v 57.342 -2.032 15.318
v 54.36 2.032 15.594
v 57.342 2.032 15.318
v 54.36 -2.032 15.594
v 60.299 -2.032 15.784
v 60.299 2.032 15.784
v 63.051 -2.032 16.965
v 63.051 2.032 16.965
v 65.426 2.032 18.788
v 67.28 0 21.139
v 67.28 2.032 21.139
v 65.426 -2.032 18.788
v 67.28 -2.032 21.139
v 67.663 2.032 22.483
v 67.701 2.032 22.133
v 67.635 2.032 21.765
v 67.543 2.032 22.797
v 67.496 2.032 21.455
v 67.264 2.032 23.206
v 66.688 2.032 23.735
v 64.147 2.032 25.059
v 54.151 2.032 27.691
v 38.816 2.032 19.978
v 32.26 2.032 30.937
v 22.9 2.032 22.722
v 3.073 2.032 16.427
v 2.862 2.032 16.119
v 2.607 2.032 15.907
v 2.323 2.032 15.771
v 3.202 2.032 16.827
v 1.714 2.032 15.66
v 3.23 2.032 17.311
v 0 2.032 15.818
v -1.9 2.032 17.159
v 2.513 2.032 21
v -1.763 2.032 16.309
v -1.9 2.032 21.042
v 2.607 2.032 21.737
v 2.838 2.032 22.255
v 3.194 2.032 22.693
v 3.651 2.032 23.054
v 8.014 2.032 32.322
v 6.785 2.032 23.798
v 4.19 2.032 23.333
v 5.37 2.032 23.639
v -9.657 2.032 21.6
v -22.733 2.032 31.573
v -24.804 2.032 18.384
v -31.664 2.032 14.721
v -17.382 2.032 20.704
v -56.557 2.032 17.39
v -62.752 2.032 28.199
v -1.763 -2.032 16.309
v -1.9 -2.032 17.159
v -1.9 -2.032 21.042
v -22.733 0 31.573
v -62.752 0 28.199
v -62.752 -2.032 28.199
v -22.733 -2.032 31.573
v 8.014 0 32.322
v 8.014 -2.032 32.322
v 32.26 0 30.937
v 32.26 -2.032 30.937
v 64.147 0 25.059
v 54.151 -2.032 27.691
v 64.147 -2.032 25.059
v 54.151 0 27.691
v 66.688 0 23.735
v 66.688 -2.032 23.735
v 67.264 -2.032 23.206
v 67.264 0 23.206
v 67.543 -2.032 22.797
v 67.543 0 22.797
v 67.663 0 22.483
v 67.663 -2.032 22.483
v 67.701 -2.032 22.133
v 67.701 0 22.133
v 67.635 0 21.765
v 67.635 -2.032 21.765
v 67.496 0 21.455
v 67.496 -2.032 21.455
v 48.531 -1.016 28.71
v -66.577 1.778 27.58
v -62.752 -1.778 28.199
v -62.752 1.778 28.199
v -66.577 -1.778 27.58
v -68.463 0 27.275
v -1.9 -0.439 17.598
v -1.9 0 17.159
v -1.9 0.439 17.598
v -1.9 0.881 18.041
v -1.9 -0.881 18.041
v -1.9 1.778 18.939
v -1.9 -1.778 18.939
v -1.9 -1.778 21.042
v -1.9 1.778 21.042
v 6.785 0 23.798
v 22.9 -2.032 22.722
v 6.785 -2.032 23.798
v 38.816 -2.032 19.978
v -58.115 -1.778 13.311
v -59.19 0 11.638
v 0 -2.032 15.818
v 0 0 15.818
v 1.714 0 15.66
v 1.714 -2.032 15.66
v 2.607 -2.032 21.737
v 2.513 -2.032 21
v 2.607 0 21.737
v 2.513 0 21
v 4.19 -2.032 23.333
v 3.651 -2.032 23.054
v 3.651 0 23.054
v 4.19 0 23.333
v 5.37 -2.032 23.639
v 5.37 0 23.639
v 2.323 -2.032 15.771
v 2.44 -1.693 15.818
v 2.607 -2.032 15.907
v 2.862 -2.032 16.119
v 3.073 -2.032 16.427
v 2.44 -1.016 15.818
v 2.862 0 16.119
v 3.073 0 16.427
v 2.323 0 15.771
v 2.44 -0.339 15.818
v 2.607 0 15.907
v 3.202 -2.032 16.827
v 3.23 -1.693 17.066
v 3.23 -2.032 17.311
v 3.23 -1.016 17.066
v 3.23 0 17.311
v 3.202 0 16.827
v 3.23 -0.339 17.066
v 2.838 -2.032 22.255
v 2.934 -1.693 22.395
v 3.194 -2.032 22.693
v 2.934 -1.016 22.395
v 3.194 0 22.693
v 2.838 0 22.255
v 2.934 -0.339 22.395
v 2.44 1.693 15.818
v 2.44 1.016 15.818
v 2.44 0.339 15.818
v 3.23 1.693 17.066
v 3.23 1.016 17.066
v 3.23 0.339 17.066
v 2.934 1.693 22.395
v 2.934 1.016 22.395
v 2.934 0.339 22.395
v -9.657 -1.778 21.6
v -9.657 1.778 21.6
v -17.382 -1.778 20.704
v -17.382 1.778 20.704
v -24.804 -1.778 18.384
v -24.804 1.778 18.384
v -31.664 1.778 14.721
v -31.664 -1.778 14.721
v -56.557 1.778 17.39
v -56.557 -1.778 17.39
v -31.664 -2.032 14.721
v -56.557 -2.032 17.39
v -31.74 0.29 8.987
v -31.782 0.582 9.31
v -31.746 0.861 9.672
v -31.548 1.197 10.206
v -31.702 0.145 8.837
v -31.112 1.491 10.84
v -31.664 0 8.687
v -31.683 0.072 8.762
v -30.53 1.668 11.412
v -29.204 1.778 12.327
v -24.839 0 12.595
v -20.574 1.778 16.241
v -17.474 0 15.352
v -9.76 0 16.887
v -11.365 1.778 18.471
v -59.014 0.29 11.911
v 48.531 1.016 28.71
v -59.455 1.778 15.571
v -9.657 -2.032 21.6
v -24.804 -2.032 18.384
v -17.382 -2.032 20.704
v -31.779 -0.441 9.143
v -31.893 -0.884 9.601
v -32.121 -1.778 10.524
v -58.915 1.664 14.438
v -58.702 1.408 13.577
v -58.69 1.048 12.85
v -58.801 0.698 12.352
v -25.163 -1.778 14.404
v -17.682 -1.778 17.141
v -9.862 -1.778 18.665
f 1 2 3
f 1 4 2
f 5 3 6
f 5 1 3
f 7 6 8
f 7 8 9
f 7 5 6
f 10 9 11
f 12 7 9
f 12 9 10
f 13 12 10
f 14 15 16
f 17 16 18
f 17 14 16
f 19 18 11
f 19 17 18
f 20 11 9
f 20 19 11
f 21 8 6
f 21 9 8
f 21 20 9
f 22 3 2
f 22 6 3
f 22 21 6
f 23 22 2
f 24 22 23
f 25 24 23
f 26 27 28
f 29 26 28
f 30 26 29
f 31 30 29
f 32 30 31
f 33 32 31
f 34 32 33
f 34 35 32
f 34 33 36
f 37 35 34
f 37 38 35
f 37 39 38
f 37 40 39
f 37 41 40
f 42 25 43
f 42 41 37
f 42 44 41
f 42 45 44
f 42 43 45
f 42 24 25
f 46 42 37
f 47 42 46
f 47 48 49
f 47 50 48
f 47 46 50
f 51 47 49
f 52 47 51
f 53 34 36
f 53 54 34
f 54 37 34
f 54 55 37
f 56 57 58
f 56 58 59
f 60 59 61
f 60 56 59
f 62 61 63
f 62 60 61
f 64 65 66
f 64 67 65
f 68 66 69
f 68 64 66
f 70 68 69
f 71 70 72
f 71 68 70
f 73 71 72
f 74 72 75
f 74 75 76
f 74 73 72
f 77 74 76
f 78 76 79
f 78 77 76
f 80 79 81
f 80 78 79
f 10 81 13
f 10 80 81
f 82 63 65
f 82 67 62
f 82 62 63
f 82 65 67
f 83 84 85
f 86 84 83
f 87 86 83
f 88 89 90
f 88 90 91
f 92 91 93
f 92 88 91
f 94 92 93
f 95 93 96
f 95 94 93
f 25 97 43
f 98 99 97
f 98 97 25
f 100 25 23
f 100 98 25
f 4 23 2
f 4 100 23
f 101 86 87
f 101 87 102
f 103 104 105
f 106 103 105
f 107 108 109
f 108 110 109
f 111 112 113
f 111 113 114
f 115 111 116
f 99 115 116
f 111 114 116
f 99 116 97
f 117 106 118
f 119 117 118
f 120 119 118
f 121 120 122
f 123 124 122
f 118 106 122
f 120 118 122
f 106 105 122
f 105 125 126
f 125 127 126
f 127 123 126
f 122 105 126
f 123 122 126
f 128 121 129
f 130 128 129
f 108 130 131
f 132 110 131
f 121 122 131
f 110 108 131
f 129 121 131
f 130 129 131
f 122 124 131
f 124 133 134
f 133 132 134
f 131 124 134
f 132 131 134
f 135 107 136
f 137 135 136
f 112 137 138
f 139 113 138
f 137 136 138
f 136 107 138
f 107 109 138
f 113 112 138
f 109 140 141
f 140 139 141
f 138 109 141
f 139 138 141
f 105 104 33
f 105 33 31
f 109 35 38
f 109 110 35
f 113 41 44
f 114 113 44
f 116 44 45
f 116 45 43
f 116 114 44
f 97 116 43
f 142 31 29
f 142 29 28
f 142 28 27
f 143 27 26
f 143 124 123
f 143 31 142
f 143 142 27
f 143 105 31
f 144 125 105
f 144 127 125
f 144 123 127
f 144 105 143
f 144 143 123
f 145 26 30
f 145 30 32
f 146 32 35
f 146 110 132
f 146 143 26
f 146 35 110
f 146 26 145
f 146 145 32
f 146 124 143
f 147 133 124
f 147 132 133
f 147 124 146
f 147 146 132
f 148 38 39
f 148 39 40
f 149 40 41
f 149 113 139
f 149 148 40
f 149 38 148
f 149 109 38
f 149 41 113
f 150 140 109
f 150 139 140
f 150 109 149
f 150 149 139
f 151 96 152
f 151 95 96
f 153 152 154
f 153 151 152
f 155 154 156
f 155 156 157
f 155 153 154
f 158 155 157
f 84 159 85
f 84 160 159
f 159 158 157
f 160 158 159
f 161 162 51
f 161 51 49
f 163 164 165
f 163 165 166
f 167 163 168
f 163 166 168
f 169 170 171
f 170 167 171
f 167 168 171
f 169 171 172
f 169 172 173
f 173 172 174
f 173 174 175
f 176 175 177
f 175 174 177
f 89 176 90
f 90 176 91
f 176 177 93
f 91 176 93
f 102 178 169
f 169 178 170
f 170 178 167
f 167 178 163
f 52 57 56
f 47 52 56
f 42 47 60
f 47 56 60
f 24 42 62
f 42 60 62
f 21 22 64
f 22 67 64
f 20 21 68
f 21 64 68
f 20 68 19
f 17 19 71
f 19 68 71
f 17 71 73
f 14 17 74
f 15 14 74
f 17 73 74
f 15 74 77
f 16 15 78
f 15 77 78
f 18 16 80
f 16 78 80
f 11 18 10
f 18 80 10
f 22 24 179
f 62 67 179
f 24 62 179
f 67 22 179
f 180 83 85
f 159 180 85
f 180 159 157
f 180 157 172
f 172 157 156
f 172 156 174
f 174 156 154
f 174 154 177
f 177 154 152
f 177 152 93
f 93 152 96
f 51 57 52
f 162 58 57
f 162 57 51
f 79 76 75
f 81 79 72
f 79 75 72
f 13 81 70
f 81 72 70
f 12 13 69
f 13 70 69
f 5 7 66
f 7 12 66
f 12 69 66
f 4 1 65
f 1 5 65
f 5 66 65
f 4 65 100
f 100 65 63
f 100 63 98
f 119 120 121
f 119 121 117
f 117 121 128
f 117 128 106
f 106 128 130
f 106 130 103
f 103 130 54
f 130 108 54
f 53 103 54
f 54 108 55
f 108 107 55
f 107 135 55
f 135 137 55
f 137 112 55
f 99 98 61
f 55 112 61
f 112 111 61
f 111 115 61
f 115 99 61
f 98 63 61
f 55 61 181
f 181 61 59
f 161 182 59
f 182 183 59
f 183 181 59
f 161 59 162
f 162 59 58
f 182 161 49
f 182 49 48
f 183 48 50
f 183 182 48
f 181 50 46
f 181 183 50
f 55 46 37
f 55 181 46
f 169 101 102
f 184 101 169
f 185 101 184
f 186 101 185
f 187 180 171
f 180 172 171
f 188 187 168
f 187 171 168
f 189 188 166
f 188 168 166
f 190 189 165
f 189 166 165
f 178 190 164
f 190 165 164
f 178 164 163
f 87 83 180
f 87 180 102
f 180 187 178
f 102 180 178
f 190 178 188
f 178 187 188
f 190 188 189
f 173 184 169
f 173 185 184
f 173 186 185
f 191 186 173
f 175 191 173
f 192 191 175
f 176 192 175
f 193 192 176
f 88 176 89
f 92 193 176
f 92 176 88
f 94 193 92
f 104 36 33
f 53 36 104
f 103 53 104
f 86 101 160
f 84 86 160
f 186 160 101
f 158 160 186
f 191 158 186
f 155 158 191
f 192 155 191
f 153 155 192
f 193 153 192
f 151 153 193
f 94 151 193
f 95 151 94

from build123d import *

# Parameters (mm, degrees)
F1_DEPTH = 2.032
F2_DEPTH = 1.778
F3_SIZE  = 1.77799
F4_R     = 5.08


# Not quite as in the source:
# - a fillet or chamfer is up to 0.001 mm smaller than in the source, because OpenCascade refuses the exact size


with BuildPart() as f1:
    # F0 (on Front) → F1 (new body, symmetric)
    with BuildSketch(Plane.XZ):
        with BuildLine():
            add(Edge.make_bspline(
                [(-62.7524927258, 28.1987972558), (-5.5860476855, 34.2682807977), (34.9384894232, 32.5216500899), (69.9510998155, 24.4512375904), (67.279830575, 21.1393777281)],
                knots=[0, 0, 0, 0, 0.7011346116, 1, 1, 1, 1], degree=3))
            Line((-62.7524927258, 28.1987972558), (-56.5566755831, 17.3903722316))
            Line((-56.5566755831, 17.3903722316), (-31.6641740501, 14.7209839443))
            ThreePointArc((-31.6641740501, 14.7209839443), (-17.3816327548, 20.703845911), (-1.9003116759, 21.0419595242))
            Line((-1.9003116759, 21.0419595242), (-1.9003116759, 17.1594452113))
            Line((-1.9003116759, 17.1594452113), (-1.7631361261, 16.3091998547))
            Line((-1.7631361261, 16.3091998547), (0, 15.8177418634))
            add(Edge.make_bspline(
                [(0, 15.8177418634), (1.0554286018, 15.6506710745), (2.4935673391, 15.483267377), (3.6762898855, 17.0941419119), (2.2318424188, 20.5970397753), (2.747819389, 22.4813980256), (4.3424194487, 23.5829041278), (5.8122159988, 23.7040893948), (6.7852635402, 23.7978529185)],
                knots=[0, 0, 0, 0, 0.1752354273, 0.3115686834, 0.5249745977, 0.6762943435, 0.8224611993, 1, 1, 1, 1], degree=3))
            ThreePointArc((6.7852635402, 23.7978529185), (30.8936565264, 21.5570594528), (54.3601624668, 15.5939338729))
            ThreePointArc((54.3601624668, 15.5939338729), (61.7117251, 16.2891237606), (67.279830575, 21.1393777281))
        make_face()
    extrude(amount=F1_DEPTH, both=True)


with BuildPart() as f2:
    # F0 (on Front) → F2 (new body, symmetric)
    with BuildSketch(Plane.XZ):
        Polygon((-56.5566755831, 17.3903722316), (-62.7524927258, 28.1987972558), (-68.4629157186, 27.2753052413), (-59.1897256672, 11.6384970024), align=None)
        Polygon((-31.6641740501, 14.7209839443), (-56.5566755831, 17.3903722316), (-59.1897256672, 11.6384970024), (-31.6641740501, 8.6867492646), align=None)
        with BuildLine():
            ThreePointArc((-1.9003116759, 21.0419595242), (-17.3816327548, 20.703845911), (-31.6641740501, 14.7209839443))
            Line((-31.6641740501, 14.7209839443), (-31.6641740501, 8.6867492646))
            ThreePointArc((-31.6641740501, 8.6867492646), (-17.4737066723, 15.3521509637), (-1.9003116759, 17.1594452113))
            Line((-1.9003116759, 17.1594452113), (-1.9003116759, 21.0419595242))
        make_face()
    extrude(amount=F2_DEPTH, both=True)

    # F3 (size 1.778 in the source; OpenCascade refuses exactly that, so slightly less here)
    f3_edges = [f2.edges().sort_by_distance(p)[0] for p in [
        (-17.473707, -1.778, 15.352151),
        (-17.473707, 1.778, 15.352151),
        (-45.42695, -1.778, 10.162623),
        (-45.42695, 1.778, 10.162623),
        (-63.826321, -1.778, 19.456901),
        (-63.826321, 1.778, 19.456901),
    ]]
    chamfer(f3_edges, length=F3_SIZE)

    # F4
    f4_edges = [f2.edges().sort_by_distance(p)[0] for p in [
        (-45.117862, 1.778, 11.917662),
    ]]
    fillet(f4_edges, radius=F4_R)


solid = Compound([f1.part, f2.part])
